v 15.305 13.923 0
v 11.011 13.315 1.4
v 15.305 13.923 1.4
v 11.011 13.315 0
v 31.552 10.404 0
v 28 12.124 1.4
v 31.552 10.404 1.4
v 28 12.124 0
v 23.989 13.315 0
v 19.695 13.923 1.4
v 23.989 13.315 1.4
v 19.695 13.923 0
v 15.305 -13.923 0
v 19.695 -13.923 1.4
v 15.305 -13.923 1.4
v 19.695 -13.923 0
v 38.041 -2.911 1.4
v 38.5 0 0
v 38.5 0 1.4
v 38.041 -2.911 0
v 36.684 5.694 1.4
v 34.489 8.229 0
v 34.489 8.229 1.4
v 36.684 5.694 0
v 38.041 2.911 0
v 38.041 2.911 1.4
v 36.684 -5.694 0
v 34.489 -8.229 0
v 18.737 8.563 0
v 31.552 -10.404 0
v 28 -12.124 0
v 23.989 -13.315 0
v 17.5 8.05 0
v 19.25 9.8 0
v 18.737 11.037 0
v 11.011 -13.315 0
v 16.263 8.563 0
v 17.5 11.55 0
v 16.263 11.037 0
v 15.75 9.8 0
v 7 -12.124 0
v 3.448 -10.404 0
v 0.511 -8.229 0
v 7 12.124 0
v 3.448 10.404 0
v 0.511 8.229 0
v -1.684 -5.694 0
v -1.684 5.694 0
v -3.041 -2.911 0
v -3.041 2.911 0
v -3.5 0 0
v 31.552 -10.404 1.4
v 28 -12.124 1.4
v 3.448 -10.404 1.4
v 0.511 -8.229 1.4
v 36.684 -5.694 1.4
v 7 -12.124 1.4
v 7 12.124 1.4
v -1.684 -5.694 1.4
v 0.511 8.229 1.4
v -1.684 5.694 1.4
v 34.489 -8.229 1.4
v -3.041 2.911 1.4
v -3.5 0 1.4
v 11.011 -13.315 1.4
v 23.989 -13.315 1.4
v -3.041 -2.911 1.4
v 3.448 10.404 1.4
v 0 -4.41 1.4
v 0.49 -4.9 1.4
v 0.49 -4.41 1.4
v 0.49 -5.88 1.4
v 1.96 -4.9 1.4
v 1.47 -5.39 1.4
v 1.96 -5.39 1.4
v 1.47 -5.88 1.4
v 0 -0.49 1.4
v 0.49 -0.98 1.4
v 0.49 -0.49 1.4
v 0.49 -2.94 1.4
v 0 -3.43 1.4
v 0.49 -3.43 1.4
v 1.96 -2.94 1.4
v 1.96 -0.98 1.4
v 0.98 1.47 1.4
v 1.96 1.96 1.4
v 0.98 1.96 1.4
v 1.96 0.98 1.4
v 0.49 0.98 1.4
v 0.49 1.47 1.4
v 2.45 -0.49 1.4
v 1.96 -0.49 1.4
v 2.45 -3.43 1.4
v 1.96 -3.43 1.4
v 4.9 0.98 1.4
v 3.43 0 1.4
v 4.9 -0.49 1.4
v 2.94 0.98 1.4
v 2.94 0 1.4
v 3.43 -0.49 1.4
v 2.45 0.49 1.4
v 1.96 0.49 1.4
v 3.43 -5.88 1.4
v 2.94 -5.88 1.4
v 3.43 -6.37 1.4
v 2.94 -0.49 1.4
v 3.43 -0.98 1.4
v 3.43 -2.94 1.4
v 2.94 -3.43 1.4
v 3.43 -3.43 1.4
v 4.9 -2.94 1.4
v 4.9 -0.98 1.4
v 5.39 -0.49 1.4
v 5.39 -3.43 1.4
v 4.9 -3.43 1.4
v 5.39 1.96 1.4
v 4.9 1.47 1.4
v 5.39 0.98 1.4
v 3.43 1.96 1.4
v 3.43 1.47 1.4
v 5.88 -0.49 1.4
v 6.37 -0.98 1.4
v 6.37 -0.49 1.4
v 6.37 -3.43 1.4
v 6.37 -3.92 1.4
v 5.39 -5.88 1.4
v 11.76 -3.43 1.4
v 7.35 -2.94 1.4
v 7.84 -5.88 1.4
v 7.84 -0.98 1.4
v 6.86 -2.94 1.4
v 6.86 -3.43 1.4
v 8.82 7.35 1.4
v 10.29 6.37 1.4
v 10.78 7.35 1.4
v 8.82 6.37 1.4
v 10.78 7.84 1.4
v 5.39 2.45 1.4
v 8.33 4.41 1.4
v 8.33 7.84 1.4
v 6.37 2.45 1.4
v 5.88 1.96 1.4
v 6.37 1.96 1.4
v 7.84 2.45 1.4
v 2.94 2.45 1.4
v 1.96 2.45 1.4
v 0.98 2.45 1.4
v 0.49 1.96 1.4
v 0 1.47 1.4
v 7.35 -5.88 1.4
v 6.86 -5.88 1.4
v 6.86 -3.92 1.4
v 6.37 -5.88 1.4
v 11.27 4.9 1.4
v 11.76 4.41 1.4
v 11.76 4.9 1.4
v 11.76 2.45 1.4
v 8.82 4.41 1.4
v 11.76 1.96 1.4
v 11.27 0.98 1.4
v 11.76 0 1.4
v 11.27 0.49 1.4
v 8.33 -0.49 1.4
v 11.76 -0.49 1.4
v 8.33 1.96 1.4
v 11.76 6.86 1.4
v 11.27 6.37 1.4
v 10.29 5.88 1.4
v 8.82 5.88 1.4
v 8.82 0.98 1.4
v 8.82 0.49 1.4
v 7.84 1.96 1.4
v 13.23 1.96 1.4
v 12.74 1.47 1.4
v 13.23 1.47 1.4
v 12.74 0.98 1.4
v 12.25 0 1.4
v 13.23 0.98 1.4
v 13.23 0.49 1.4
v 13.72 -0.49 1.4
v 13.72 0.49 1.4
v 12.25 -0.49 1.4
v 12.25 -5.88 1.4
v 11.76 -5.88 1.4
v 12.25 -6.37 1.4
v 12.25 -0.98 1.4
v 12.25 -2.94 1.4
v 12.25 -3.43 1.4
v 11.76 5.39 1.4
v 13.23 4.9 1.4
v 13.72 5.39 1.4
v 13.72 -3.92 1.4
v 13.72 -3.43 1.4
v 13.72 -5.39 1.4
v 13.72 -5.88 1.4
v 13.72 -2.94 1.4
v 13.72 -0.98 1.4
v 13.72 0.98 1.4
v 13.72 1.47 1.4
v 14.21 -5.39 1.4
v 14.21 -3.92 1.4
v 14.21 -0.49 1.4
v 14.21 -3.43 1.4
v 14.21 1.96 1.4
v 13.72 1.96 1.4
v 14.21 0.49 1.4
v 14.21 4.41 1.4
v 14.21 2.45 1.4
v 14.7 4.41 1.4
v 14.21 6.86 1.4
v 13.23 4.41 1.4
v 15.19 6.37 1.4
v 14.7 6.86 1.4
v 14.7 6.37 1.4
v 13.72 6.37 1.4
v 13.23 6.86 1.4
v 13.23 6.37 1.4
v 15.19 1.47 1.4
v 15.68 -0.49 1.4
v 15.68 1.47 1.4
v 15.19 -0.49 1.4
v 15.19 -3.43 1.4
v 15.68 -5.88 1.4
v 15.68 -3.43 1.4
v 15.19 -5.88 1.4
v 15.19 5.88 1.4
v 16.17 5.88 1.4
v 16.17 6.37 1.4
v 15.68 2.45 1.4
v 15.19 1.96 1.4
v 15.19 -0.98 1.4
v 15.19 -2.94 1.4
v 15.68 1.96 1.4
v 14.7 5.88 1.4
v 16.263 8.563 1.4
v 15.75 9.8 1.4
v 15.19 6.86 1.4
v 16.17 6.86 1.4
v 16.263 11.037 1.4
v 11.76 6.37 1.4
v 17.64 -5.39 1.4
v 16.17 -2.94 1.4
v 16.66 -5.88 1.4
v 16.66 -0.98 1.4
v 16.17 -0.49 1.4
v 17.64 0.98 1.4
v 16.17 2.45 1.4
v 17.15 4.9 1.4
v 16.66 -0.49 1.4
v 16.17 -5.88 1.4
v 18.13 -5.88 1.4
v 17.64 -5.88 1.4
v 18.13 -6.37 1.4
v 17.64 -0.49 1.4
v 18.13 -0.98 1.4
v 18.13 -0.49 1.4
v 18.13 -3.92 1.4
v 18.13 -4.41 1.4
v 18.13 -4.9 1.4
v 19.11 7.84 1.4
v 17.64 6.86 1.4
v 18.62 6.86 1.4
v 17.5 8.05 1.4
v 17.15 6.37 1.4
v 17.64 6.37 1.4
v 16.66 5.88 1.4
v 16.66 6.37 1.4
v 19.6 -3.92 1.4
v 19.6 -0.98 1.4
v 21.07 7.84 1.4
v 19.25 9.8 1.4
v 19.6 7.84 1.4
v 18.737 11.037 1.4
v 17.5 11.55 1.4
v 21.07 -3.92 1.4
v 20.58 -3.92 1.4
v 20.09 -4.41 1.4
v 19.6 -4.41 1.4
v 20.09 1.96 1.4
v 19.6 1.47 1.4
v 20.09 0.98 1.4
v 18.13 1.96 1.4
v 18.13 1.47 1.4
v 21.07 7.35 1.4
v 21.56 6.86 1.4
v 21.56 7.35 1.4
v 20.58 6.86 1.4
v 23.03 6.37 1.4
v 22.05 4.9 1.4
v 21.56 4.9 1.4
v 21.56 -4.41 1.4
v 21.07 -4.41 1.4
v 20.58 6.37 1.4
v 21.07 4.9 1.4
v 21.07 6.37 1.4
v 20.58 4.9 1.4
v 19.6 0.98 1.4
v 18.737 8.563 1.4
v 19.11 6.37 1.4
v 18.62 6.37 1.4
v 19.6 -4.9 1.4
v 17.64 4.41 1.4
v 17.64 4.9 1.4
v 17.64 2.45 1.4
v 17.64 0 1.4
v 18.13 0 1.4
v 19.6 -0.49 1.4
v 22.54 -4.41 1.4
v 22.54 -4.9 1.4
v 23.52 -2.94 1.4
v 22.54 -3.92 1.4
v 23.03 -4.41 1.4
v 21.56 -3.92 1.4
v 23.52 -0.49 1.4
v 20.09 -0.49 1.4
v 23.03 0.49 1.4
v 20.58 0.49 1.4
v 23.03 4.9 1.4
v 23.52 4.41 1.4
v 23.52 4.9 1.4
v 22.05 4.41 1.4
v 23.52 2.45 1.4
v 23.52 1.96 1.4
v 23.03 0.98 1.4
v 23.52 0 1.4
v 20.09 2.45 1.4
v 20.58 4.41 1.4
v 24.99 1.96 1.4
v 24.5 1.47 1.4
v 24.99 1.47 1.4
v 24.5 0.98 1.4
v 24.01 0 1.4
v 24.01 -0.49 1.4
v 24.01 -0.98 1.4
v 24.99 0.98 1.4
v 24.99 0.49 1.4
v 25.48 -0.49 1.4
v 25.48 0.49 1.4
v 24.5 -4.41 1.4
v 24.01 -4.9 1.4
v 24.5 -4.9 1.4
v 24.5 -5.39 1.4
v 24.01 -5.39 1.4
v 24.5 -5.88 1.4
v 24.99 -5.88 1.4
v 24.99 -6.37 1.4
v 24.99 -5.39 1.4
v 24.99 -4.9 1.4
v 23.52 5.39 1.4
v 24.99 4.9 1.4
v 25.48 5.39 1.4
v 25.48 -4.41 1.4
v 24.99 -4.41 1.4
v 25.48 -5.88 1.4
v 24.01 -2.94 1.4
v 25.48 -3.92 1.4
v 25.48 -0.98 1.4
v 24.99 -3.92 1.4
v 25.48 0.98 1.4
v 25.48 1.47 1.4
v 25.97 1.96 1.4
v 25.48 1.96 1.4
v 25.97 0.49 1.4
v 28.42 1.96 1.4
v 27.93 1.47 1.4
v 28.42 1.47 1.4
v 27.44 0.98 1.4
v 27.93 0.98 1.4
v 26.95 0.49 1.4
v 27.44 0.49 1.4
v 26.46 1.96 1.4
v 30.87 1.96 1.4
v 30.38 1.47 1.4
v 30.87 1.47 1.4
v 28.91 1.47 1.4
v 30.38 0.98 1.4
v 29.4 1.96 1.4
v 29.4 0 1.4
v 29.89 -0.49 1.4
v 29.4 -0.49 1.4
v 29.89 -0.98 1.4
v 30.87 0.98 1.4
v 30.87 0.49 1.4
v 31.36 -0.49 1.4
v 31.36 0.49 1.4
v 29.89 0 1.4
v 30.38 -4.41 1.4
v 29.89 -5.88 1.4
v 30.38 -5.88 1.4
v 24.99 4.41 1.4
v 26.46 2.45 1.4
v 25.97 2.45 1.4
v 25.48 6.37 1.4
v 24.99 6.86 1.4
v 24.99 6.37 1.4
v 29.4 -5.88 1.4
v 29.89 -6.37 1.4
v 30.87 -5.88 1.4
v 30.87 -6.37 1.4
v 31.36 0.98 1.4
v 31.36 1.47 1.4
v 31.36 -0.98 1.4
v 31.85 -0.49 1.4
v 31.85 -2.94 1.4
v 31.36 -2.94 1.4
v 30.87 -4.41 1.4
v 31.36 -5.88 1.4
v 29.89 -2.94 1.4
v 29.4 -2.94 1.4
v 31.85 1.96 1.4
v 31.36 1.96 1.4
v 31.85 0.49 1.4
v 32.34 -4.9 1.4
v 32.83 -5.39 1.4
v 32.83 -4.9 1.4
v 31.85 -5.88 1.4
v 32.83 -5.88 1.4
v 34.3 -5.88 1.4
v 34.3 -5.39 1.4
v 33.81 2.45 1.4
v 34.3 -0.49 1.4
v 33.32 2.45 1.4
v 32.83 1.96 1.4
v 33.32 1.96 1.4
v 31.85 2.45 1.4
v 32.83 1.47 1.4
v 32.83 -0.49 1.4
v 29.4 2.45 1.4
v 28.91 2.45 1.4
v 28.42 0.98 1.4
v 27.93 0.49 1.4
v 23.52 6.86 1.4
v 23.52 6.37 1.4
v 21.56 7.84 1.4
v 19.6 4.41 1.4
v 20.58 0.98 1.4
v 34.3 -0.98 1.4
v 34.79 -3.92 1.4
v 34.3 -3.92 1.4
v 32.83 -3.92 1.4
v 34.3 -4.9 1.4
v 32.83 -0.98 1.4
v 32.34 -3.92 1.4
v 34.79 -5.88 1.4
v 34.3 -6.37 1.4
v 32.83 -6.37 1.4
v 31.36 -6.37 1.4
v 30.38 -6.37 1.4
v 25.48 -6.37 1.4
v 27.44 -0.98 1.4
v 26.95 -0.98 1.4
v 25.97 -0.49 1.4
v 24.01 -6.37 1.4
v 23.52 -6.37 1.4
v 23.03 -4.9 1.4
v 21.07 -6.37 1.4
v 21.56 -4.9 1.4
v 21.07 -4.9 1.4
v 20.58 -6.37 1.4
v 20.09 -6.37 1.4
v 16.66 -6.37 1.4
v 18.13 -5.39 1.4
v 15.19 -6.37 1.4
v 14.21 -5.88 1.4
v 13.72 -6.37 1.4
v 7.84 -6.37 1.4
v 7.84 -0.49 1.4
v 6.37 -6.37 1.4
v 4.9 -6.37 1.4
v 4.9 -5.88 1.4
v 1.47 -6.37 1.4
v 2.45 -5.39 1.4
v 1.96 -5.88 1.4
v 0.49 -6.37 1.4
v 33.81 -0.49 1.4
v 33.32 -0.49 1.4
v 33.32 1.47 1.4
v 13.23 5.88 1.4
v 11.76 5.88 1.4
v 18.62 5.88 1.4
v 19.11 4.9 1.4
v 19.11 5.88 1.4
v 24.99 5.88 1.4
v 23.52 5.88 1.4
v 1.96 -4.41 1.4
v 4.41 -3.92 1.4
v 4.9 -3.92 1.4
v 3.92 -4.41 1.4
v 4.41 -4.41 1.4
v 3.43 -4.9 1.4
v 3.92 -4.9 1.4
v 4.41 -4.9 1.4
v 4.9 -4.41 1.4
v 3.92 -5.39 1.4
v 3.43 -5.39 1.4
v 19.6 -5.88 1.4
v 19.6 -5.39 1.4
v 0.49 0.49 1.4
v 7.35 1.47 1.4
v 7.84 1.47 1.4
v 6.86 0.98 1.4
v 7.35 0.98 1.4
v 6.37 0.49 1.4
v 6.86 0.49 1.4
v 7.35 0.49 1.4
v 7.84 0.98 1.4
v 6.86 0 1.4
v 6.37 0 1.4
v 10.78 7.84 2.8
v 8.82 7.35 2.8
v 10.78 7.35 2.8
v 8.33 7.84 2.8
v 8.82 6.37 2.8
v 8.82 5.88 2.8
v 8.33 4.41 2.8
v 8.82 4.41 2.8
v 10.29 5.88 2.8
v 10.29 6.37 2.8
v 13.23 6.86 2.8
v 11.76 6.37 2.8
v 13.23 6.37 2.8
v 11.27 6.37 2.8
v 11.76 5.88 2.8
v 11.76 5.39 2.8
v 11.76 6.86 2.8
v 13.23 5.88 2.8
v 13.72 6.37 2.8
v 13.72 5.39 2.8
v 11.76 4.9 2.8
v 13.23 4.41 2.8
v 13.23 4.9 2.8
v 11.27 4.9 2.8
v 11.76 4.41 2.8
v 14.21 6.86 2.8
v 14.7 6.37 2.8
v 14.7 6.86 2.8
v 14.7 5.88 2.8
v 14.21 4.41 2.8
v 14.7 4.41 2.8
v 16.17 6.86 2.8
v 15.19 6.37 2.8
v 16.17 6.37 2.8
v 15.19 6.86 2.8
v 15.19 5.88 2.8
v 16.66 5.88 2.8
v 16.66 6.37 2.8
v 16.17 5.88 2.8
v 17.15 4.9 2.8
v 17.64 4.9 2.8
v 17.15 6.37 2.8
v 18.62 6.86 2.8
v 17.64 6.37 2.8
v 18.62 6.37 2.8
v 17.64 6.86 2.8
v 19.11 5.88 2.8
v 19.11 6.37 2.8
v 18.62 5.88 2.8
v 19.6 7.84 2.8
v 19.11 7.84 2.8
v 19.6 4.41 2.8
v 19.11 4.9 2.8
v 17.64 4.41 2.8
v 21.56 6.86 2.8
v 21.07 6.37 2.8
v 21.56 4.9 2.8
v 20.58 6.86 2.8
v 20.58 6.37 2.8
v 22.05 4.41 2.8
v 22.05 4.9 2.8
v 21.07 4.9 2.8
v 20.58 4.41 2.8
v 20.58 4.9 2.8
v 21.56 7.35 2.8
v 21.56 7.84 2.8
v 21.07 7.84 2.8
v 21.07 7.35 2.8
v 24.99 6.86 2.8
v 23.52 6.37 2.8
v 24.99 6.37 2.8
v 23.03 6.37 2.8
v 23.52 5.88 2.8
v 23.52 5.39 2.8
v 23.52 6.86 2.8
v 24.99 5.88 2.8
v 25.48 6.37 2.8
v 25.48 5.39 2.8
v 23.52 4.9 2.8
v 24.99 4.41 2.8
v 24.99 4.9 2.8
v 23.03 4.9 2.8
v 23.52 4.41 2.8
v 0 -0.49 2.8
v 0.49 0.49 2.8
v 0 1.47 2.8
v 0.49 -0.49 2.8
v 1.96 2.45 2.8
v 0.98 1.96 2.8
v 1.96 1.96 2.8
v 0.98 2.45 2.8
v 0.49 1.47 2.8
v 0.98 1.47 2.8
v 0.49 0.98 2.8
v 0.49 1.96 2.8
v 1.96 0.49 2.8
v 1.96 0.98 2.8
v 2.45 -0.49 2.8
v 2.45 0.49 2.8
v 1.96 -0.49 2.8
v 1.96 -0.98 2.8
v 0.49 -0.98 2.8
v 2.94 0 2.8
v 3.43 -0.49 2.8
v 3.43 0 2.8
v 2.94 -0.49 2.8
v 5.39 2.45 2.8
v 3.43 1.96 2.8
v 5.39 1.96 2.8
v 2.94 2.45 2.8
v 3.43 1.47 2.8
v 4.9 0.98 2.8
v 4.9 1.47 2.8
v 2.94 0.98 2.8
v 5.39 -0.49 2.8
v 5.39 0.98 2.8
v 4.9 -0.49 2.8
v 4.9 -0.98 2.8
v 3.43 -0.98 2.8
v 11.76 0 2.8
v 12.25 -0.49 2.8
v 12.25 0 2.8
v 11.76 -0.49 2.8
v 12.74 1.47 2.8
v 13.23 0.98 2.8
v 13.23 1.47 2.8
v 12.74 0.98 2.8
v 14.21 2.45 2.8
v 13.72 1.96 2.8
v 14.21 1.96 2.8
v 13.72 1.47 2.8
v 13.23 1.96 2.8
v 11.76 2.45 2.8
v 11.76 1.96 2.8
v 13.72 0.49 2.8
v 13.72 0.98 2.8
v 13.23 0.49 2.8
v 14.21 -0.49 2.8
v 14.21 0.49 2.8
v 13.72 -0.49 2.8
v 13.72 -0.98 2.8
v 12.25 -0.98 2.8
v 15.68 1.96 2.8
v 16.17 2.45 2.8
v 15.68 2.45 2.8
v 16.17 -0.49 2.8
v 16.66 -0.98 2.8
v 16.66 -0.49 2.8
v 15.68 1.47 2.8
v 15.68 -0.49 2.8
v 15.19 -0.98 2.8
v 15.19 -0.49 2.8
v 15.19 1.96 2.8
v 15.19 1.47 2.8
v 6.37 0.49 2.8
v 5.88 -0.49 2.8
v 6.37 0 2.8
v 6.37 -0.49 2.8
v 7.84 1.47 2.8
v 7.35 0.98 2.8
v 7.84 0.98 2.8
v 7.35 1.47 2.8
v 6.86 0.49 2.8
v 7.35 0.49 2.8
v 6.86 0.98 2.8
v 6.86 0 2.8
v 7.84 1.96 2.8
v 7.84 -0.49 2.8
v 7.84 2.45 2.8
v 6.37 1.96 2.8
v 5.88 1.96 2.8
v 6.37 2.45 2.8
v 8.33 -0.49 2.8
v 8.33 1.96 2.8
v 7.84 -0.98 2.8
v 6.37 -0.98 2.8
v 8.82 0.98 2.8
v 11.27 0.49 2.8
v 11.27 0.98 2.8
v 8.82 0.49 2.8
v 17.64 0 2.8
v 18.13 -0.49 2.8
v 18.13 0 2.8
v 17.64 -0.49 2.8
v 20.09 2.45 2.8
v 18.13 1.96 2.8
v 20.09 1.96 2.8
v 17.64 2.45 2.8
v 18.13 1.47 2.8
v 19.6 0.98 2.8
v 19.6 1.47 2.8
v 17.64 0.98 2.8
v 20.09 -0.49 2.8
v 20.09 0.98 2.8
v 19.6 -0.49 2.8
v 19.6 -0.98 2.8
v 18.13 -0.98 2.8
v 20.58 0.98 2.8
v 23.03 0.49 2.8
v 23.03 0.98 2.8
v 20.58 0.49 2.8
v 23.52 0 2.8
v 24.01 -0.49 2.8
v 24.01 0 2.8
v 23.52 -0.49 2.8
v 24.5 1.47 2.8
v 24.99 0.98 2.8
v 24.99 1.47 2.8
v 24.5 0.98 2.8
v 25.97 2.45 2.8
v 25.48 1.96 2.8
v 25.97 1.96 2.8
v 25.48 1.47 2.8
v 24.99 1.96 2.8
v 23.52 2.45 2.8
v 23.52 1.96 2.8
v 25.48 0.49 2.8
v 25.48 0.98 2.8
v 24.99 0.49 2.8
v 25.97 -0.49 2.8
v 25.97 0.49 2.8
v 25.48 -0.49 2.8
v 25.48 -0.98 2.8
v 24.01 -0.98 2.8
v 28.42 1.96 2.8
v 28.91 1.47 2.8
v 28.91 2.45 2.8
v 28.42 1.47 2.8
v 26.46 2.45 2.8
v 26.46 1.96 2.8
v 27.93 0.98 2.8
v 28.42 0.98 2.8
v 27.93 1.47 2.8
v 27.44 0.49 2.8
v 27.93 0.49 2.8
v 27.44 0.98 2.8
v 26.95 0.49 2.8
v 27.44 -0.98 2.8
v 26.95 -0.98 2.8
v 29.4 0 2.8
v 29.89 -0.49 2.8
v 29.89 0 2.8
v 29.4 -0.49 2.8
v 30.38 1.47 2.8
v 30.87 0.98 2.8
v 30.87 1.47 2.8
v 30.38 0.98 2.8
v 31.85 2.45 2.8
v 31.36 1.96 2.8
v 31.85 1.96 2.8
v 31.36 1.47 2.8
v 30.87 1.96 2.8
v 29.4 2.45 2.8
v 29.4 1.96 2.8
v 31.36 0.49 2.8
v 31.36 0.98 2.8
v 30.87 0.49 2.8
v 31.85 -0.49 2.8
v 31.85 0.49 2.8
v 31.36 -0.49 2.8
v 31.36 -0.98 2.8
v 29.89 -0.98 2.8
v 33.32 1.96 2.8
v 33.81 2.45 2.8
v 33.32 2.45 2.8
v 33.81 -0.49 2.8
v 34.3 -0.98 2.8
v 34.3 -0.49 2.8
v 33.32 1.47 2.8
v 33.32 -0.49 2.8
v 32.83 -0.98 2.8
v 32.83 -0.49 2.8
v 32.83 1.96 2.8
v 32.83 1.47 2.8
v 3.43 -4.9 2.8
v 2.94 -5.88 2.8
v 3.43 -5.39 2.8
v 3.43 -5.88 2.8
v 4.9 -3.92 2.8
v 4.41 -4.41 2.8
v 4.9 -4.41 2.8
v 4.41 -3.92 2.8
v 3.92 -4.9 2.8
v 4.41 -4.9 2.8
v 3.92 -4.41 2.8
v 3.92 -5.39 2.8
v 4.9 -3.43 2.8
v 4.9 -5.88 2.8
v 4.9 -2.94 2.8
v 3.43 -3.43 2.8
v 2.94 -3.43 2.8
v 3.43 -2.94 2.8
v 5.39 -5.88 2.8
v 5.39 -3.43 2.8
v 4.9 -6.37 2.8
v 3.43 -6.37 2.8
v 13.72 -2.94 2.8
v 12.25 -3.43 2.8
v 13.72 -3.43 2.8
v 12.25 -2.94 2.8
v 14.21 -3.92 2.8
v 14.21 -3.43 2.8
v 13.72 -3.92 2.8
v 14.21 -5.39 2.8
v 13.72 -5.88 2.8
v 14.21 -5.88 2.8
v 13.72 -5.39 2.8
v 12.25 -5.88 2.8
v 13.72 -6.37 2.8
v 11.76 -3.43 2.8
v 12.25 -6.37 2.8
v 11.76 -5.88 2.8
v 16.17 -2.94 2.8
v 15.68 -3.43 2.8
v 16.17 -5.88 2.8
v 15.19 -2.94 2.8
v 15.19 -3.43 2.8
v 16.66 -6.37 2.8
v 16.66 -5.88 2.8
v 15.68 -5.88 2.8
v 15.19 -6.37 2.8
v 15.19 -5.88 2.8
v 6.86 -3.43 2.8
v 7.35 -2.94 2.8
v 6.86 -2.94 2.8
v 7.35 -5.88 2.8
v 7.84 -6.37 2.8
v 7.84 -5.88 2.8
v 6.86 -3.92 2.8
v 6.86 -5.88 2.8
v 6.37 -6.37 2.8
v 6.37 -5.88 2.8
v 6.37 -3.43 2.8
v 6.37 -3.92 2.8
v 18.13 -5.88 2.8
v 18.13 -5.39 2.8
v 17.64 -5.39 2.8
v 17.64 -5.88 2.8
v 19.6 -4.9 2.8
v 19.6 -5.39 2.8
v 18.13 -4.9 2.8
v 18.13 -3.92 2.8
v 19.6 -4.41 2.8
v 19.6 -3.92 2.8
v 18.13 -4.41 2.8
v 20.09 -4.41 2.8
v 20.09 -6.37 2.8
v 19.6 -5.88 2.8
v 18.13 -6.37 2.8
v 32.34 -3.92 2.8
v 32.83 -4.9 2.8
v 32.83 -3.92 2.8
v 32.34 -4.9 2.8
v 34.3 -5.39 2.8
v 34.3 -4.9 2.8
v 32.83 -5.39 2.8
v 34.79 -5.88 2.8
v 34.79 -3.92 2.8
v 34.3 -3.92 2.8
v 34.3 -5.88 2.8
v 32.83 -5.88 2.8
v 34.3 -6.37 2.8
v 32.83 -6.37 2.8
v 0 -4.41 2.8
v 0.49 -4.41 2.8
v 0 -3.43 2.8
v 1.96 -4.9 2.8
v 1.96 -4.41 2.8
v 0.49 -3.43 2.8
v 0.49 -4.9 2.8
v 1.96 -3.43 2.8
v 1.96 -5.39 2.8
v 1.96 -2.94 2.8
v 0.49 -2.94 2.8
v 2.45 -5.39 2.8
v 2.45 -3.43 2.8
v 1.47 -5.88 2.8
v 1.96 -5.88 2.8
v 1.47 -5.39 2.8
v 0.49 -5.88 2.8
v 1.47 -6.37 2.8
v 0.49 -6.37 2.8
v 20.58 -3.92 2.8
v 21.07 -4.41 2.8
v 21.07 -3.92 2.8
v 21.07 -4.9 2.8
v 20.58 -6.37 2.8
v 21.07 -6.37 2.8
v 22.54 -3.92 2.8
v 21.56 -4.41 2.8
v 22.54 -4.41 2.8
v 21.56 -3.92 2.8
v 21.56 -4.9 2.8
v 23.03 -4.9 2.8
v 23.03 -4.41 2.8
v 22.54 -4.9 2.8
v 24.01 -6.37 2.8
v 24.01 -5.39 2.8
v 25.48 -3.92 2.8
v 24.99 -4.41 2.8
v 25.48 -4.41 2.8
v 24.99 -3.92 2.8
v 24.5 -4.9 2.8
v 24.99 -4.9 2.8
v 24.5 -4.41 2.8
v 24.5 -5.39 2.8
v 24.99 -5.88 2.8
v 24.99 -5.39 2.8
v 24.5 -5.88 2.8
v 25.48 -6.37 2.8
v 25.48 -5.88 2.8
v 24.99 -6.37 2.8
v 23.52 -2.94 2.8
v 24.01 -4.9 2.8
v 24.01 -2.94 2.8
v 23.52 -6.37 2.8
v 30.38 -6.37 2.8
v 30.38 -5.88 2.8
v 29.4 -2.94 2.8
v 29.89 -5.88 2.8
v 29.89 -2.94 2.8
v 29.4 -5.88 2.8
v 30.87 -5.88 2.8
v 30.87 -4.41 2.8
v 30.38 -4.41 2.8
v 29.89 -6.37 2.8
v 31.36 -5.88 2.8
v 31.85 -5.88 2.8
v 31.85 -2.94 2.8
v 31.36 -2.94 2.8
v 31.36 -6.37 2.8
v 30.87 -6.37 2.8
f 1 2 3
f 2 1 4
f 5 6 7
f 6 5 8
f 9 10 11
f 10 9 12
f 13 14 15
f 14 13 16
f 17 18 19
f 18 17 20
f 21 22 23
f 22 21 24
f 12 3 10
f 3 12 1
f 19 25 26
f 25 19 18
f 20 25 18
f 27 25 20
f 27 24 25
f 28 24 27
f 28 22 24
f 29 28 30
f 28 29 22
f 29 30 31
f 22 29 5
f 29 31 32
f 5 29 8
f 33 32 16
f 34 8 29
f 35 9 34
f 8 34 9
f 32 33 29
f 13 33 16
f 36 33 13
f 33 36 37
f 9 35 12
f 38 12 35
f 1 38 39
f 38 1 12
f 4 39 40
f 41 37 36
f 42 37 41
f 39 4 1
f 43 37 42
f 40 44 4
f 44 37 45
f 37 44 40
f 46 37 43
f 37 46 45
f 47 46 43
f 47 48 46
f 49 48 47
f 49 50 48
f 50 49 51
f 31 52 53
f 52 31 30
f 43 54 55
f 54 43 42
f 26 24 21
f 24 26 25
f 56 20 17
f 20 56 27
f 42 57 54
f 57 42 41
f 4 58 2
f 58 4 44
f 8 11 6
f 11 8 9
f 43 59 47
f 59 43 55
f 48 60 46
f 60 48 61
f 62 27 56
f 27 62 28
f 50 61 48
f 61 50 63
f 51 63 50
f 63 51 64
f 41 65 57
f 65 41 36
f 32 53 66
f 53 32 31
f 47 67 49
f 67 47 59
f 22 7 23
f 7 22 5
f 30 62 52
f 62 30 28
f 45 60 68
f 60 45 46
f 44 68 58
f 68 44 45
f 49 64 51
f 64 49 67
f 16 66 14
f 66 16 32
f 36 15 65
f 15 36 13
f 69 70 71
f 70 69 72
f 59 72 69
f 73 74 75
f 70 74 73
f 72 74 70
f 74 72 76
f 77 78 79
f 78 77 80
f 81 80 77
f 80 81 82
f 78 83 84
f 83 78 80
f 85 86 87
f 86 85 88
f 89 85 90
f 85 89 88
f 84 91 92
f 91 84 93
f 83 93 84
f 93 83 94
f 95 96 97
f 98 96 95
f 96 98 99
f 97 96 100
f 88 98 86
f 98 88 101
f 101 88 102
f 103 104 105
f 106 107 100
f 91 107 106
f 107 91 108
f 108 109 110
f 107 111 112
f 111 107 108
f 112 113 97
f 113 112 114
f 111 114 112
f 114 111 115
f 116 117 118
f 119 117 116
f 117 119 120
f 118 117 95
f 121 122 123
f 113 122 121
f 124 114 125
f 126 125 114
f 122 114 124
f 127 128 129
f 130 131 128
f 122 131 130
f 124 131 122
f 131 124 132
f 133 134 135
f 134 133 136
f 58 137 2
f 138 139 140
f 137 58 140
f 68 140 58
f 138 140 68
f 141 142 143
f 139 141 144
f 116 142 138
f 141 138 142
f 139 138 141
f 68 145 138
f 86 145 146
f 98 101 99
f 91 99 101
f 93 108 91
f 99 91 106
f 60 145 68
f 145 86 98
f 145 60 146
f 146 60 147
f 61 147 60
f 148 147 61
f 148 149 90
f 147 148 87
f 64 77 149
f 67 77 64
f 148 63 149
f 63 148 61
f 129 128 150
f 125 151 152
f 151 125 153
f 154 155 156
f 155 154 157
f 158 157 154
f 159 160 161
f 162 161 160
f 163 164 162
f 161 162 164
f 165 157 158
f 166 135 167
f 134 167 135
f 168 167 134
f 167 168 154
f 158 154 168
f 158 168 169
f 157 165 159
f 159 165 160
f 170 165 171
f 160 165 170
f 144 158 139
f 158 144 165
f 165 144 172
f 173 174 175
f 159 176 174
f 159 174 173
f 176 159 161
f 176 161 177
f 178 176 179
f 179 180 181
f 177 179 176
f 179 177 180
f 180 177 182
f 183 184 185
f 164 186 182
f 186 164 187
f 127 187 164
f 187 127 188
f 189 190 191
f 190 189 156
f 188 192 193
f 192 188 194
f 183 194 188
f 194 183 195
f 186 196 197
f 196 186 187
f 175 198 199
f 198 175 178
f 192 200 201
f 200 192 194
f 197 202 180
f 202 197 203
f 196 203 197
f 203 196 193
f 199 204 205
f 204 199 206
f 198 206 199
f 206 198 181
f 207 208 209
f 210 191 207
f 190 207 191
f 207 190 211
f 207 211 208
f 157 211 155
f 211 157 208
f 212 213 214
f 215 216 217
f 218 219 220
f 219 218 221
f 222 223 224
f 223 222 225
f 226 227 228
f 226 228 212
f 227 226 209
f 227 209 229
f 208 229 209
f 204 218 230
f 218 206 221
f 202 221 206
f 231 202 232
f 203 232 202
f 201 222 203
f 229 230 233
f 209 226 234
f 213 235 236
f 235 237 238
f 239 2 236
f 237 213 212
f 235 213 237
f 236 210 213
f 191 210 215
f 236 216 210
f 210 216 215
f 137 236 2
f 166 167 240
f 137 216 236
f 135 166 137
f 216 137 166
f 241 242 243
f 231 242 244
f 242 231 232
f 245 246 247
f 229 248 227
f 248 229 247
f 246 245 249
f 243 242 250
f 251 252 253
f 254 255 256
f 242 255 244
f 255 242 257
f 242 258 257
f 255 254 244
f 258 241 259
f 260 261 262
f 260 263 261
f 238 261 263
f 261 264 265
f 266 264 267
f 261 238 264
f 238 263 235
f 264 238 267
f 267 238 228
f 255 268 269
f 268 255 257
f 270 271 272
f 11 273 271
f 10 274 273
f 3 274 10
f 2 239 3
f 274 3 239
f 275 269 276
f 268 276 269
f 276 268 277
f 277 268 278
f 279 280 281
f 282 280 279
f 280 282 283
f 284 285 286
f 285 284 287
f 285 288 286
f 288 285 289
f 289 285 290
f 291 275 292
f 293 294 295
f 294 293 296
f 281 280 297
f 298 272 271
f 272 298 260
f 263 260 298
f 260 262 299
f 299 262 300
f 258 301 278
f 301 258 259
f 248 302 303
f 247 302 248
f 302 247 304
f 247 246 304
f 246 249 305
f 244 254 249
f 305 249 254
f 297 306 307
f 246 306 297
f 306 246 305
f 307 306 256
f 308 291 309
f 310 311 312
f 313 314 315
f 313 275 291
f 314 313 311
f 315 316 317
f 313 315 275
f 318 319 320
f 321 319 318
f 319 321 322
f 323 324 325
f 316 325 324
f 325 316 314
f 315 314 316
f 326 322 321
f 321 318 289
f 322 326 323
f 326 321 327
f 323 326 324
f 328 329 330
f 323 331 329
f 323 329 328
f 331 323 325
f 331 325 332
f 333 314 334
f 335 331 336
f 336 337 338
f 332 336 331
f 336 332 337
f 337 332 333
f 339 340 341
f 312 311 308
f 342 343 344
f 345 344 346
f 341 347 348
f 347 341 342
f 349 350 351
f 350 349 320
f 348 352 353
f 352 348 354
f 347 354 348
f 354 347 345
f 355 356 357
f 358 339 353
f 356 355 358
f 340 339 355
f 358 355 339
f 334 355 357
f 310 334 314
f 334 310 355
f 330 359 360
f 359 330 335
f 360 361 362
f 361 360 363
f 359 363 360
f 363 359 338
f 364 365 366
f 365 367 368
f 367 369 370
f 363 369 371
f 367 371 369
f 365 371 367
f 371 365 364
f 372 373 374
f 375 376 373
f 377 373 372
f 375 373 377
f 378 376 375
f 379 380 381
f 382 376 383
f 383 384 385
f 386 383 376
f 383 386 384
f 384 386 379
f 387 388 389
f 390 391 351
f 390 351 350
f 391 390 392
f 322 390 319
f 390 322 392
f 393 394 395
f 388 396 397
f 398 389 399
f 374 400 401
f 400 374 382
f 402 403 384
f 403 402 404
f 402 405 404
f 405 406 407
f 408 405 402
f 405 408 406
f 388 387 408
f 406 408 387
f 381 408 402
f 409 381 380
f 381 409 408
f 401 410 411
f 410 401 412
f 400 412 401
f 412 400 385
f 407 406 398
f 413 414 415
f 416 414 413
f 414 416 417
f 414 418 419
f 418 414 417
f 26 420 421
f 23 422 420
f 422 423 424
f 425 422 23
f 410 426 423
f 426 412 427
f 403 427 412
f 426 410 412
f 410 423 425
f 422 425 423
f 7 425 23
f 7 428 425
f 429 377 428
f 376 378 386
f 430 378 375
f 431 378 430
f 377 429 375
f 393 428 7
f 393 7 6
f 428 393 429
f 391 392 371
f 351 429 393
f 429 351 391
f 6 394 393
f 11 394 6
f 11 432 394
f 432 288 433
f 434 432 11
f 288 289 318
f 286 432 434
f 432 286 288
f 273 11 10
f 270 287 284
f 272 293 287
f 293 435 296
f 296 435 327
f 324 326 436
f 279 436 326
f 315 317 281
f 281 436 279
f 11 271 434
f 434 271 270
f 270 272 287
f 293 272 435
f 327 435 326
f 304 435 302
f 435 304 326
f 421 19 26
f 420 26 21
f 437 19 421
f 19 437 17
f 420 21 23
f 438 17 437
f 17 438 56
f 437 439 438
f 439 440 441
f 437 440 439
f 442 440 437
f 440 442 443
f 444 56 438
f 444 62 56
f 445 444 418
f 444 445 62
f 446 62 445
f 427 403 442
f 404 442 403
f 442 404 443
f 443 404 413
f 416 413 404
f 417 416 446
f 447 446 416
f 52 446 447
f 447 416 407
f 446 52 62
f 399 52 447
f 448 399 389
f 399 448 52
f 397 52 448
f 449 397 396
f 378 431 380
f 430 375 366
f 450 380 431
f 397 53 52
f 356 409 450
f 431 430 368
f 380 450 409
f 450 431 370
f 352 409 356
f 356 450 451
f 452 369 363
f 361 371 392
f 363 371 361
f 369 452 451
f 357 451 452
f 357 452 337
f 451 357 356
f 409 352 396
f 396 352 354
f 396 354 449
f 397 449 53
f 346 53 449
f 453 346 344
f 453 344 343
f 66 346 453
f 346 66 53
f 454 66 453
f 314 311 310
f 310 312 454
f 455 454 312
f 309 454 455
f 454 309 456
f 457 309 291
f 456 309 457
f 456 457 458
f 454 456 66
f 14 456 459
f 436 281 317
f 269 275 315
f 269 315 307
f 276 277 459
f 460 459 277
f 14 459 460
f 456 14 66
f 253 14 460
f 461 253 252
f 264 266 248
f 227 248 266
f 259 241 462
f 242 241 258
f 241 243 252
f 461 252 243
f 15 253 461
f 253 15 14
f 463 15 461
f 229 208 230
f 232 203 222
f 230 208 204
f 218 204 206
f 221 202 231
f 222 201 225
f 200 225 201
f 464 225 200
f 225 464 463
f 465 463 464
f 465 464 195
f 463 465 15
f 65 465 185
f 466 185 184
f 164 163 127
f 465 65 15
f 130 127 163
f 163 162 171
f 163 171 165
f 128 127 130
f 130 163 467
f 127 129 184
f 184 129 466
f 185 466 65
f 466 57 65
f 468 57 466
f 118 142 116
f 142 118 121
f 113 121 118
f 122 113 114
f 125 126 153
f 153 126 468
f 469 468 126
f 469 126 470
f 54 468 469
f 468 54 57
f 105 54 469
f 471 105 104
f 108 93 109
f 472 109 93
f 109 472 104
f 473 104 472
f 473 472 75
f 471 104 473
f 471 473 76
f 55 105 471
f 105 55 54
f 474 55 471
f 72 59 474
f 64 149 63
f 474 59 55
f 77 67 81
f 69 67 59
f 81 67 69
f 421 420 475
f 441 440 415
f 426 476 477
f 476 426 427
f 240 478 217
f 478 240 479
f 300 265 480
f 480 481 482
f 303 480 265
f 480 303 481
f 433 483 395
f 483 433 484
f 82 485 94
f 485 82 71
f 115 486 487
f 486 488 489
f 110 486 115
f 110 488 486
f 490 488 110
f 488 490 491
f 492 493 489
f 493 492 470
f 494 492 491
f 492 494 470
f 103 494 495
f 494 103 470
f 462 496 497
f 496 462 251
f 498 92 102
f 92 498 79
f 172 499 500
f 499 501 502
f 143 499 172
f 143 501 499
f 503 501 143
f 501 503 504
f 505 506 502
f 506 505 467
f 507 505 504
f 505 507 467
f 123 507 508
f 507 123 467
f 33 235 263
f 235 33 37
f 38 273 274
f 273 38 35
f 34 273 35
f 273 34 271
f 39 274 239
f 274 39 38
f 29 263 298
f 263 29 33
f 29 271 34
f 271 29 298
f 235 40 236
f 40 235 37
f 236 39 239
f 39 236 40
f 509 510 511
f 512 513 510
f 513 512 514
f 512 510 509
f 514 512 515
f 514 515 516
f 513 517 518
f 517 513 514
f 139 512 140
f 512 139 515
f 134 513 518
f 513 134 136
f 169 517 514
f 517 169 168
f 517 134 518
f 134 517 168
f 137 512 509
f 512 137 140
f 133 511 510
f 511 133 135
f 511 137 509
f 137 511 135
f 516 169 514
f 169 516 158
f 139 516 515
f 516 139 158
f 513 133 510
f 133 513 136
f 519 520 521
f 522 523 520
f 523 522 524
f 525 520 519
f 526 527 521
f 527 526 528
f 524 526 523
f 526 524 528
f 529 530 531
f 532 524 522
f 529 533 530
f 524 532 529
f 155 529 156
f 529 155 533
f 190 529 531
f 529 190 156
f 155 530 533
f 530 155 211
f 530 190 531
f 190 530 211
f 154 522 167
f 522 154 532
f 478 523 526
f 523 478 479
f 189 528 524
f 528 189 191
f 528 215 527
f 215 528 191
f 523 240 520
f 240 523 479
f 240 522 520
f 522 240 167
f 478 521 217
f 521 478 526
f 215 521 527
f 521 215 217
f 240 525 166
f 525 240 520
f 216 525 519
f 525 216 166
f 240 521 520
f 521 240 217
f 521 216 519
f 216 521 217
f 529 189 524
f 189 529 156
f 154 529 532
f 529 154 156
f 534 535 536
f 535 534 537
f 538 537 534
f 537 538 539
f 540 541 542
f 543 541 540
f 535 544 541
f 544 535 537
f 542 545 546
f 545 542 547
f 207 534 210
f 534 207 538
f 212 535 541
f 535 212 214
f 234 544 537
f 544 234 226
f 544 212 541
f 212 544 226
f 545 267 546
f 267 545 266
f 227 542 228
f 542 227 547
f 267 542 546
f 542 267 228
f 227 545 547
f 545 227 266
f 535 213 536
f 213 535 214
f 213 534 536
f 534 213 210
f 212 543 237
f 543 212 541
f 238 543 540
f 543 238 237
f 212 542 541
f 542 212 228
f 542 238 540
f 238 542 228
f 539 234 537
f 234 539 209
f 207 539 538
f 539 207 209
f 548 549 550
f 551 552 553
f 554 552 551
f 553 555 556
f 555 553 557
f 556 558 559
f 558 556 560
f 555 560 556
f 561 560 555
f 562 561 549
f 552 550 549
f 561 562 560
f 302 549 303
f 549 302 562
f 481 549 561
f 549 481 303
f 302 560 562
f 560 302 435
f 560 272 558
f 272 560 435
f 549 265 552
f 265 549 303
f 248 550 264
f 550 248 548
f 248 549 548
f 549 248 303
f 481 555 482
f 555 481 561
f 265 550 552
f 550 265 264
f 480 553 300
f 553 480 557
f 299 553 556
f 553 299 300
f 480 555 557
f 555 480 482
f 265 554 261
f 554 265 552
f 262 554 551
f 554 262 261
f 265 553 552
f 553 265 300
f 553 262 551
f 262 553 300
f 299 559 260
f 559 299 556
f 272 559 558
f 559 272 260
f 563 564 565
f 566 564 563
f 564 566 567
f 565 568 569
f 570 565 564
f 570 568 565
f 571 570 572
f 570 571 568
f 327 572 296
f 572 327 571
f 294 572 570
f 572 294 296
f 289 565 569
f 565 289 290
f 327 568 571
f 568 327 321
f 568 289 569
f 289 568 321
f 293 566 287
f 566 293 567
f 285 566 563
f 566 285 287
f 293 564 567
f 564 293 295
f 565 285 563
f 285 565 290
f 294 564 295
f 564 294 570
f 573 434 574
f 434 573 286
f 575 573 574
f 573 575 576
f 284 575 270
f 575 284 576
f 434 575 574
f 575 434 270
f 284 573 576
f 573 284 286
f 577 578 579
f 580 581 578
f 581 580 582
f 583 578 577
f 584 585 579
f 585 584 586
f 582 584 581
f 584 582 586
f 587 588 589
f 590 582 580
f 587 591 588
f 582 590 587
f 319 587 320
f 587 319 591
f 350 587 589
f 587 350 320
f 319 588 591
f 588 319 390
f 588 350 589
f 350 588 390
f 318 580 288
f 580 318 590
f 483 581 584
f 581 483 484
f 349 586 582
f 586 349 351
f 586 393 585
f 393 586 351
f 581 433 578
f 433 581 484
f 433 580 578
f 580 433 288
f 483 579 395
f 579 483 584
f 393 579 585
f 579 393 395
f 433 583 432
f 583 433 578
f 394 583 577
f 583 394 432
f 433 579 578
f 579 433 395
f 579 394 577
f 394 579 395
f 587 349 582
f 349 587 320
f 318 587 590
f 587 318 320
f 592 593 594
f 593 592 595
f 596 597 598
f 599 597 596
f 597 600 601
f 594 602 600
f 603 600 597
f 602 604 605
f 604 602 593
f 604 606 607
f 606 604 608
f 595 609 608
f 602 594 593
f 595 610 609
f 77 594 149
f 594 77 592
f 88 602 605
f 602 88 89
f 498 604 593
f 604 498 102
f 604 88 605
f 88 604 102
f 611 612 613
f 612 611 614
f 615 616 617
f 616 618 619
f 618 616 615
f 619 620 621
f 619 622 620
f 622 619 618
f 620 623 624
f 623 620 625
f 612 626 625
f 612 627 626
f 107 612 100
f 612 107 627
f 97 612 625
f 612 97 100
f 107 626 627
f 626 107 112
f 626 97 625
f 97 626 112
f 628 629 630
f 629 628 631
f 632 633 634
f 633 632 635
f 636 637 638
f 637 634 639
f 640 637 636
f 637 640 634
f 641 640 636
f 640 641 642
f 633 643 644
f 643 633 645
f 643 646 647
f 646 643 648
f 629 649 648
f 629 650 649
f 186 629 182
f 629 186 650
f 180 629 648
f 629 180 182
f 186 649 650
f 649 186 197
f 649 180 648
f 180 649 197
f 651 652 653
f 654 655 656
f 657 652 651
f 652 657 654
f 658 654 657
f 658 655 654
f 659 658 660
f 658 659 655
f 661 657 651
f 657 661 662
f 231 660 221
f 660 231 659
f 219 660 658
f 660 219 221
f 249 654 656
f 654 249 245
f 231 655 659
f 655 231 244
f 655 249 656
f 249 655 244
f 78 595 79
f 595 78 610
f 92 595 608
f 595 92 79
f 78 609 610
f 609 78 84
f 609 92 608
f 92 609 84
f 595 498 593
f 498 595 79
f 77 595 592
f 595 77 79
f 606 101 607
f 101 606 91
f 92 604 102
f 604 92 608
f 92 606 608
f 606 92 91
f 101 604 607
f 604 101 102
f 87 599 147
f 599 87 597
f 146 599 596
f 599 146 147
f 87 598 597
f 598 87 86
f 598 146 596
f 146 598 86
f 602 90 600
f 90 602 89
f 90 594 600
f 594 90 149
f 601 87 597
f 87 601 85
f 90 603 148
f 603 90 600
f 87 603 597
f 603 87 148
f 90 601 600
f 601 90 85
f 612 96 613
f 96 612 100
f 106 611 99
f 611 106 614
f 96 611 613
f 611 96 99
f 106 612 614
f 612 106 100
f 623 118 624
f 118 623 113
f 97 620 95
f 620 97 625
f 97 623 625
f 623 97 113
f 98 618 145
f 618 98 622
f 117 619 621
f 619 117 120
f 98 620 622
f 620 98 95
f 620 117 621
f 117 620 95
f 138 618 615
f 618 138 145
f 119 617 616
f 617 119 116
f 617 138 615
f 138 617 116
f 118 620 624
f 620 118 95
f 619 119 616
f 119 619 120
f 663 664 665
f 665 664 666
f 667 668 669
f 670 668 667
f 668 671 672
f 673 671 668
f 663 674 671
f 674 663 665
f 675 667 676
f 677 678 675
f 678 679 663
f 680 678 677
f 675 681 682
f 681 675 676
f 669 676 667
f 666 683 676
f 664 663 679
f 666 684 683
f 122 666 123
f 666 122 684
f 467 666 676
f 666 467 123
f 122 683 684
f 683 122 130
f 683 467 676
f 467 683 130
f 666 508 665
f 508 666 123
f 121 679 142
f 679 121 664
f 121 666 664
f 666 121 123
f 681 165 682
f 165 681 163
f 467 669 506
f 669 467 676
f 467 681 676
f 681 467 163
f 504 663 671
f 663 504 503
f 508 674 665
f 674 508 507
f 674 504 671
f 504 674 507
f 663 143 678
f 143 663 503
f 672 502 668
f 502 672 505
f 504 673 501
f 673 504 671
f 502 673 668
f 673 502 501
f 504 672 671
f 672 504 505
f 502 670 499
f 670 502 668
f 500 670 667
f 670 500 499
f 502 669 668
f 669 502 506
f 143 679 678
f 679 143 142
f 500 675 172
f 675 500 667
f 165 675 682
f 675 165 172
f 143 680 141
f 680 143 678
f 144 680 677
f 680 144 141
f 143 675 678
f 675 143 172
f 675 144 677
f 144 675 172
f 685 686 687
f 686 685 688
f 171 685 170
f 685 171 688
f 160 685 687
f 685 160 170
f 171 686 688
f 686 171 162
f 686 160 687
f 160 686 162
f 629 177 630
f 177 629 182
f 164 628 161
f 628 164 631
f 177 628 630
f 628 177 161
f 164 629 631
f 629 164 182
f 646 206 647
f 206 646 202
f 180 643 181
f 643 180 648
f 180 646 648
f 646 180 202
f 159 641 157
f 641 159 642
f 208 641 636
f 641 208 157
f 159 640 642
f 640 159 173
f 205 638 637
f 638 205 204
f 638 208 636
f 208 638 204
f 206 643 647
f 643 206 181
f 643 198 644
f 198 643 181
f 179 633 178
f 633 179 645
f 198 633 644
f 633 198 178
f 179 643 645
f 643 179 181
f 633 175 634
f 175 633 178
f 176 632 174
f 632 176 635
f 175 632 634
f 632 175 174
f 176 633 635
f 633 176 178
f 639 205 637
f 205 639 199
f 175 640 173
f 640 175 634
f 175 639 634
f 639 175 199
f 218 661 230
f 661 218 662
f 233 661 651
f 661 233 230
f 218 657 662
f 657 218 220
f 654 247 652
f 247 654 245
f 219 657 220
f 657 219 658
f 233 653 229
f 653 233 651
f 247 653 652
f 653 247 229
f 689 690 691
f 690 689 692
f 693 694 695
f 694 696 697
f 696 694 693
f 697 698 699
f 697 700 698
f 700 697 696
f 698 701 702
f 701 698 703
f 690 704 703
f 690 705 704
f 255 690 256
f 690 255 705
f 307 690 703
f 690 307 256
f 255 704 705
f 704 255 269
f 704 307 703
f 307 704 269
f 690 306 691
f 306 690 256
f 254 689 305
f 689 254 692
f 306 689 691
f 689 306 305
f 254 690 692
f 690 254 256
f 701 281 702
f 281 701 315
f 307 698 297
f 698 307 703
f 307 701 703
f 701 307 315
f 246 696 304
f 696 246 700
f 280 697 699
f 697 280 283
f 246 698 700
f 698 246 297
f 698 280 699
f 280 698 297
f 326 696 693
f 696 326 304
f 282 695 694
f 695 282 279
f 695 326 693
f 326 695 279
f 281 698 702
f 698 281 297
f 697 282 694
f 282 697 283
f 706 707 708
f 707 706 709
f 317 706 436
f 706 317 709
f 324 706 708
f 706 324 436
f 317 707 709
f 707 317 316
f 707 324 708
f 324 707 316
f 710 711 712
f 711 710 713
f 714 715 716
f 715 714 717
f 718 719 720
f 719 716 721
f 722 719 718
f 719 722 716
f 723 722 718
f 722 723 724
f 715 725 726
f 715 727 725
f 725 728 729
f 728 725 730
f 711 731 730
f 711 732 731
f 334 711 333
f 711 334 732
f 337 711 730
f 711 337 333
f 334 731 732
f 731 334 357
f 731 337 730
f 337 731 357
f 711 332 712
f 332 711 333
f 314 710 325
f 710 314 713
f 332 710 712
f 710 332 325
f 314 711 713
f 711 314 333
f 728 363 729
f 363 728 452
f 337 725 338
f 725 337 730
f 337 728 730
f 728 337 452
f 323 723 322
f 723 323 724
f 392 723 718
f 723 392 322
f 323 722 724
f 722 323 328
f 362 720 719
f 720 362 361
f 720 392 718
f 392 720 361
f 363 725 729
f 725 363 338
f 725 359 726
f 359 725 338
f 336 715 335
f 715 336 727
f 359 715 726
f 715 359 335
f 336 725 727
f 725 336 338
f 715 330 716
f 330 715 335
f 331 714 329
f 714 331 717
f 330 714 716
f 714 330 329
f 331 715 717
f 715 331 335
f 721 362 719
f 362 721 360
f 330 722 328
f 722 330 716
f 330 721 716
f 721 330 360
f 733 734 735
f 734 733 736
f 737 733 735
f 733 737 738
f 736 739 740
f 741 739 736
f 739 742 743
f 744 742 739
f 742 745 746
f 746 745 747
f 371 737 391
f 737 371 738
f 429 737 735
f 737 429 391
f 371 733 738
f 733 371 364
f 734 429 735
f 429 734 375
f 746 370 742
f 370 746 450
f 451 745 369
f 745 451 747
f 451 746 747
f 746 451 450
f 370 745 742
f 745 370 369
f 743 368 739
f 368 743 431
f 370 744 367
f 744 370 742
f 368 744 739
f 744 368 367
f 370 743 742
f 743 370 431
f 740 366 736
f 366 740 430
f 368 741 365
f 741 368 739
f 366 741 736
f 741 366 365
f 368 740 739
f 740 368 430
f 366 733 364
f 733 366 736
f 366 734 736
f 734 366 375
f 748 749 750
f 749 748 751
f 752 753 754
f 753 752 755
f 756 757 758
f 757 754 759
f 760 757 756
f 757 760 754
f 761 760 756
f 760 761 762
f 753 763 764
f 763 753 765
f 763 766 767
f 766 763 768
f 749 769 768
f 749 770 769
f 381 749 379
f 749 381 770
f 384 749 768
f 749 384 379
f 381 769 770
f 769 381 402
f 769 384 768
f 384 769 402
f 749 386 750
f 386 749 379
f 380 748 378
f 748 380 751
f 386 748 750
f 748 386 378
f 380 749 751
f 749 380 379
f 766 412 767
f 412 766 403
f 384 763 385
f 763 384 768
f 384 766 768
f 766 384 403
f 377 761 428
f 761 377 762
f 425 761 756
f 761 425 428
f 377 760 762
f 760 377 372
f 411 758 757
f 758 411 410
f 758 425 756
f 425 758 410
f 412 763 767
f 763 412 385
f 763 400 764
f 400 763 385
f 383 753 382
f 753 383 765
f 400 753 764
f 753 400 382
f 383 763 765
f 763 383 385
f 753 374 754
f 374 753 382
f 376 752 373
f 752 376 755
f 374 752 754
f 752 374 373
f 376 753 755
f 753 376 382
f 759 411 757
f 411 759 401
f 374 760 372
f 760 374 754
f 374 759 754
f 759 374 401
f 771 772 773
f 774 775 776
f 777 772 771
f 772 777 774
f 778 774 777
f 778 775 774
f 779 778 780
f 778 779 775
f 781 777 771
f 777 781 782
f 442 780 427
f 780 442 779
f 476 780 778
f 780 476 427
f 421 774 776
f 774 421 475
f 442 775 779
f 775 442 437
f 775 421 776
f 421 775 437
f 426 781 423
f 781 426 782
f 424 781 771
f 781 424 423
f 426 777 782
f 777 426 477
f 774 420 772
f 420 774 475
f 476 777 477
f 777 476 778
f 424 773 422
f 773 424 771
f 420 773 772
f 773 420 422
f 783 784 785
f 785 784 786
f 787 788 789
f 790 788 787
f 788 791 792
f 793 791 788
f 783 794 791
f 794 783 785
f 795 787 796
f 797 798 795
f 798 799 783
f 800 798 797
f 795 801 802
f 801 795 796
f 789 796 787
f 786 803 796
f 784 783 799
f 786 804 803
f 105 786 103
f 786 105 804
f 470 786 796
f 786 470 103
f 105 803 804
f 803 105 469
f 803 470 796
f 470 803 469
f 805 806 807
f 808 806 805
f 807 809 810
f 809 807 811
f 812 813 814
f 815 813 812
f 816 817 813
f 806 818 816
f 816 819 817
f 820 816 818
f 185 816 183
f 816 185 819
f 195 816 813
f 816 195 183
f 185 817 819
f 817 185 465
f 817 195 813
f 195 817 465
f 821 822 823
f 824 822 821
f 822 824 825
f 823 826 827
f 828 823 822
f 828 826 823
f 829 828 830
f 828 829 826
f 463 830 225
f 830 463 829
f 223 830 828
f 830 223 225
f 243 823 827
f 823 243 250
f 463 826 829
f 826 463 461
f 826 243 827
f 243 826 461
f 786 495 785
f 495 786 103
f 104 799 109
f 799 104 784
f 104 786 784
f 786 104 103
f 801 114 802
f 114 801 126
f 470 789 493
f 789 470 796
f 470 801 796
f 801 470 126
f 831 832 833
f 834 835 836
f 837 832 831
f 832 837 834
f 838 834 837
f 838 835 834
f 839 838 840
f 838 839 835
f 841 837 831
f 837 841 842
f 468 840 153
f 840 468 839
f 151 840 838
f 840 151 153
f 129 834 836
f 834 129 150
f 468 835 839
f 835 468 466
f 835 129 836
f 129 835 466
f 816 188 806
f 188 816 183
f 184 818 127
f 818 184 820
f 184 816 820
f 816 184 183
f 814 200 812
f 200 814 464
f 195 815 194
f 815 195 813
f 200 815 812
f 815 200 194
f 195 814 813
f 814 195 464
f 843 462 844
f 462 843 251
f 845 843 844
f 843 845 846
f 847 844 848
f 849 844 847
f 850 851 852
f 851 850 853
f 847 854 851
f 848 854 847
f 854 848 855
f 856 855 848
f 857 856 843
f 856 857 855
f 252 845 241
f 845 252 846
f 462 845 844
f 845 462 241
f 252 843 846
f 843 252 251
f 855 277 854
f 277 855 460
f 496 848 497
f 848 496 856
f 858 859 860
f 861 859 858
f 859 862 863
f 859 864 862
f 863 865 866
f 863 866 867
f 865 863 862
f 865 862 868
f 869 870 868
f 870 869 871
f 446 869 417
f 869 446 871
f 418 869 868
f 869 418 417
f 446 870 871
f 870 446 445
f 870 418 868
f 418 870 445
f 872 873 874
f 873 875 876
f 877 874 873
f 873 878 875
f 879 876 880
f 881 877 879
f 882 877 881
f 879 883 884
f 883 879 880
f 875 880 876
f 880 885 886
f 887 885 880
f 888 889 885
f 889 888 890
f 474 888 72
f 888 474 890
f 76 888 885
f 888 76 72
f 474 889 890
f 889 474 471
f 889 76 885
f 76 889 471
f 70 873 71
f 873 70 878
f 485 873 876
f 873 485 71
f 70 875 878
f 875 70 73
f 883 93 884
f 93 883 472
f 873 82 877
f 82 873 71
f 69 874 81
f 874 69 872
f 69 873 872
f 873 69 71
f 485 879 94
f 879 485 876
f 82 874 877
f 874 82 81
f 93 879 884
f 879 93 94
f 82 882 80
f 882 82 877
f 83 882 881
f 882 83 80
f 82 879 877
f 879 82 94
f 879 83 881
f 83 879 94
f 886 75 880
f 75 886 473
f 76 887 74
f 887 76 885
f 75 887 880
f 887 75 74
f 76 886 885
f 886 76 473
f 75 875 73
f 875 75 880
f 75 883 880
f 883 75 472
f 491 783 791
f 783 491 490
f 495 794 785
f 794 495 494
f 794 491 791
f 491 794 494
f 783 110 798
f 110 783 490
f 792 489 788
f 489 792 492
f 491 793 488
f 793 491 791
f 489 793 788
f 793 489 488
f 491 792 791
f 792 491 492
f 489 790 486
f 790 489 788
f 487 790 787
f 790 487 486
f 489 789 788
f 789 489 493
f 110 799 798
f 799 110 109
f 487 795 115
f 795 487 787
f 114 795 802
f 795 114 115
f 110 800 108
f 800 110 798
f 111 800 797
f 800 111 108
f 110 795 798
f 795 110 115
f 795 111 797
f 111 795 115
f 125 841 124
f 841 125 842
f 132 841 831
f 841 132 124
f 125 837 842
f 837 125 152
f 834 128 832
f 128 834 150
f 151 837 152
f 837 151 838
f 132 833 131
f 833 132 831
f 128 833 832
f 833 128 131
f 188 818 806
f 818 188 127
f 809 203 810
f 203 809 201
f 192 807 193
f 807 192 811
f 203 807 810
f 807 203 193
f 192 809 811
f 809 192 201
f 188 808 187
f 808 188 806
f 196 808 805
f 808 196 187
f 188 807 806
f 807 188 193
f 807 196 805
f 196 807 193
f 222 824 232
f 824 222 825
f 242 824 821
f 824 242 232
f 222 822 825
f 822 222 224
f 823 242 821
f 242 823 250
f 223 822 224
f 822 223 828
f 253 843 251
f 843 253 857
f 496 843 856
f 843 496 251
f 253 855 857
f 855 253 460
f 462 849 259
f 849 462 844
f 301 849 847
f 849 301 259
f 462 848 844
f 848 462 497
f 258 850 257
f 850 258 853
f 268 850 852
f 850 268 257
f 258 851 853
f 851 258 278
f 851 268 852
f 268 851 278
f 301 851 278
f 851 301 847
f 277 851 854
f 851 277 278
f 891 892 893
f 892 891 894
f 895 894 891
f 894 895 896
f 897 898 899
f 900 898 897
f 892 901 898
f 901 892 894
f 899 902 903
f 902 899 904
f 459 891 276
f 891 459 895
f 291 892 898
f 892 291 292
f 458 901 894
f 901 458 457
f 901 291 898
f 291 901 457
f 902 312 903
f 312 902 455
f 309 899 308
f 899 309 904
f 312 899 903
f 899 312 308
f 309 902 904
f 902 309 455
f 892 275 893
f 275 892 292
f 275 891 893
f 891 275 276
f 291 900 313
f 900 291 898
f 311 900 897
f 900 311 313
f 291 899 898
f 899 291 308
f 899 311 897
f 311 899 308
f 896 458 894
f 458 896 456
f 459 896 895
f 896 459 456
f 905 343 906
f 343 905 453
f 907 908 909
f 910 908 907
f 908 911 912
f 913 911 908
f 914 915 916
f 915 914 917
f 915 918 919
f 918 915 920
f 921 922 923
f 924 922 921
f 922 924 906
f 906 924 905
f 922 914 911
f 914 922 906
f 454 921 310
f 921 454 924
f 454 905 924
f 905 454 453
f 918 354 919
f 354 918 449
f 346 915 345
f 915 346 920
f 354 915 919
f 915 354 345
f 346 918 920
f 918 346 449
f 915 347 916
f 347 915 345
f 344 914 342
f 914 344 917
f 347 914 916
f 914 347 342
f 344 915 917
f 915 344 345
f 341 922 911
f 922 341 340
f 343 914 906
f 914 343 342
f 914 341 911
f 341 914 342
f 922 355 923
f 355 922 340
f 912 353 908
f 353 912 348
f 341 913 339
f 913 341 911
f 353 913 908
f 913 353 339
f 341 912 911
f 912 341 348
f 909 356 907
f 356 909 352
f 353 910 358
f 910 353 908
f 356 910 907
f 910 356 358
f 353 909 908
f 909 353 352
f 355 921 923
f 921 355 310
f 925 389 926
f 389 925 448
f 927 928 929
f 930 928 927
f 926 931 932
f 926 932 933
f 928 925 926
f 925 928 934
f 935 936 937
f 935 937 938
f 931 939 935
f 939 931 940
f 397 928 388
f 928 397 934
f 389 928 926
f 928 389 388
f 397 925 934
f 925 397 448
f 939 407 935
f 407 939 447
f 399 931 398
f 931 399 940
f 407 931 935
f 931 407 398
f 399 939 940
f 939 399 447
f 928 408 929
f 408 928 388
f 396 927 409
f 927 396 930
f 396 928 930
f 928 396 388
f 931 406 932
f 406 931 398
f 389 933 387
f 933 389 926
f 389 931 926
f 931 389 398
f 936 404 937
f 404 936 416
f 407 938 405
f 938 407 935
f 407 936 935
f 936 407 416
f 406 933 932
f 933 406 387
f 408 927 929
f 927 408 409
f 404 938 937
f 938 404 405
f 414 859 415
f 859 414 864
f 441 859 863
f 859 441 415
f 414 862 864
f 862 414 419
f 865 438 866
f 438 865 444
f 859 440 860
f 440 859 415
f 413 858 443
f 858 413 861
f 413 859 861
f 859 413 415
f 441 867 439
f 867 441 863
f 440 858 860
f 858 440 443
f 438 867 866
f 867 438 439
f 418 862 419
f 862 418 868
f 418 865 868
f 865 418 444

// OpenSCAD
//Draw text

s = 0.7;
h = 2;
module oval(w, h, height, center = false) {
  scale([1, h/w, 1]) cylinder(h=height, r=w, center=center);
}

s2 = .7;
scale([s2,s2,s2]){
difference(){
translate([25,0,0]) oval(30, 20, h);
translate([25,14,-.1]) cylinder(r=2.5, h=h*2);
}
translate([17*s,11*s-2*s,h-2]) scale([s,s,4]) drawtext("Ferdie");
translate([0,    0-2*s,h-2])   scale([s,s,4]) drawtext("650-315-3731");
translate([0*s,-11*s-2*s,h-2]) scale([s,s,4]) drawtext("901 Clark Wy");
}

//Draw character set
//scale([2,2,2]) drawtext(" !\"#$%&'()*+,-./0123456789:;<=>?@ABCDEFGHIJKLMNOPQRSTUVWXYZ[\\]^_`abcdefghijklmnopqrstuvwxyz{|}");

module drawtext(text) {
	//Characters
	chars = " !\"#$%&'()*+,-./0123456789:;<=>?@ABCDEFGHIJKLMNOPQRSTUVWXYZ[\\]^_`abcdefghijklmnopqrstuvwxyz{|}";

	//Chracter table defining 5x7 characters
	//Adapted from: http://www.geocities.com/dinceraydin/djlcdsim/chartable.js
	char_table = [ [ 0, 0, 0, 0, 0, 0, 0],
                  [ 4, 0, 4, 4, 4, 4, 4],
                  [ 0, 0, 0, 0,10,10,10],
                  [10,10,31,10,31,10,10],
                  [ 4,30, 5,14,20,15, 4],
                  [ 3,19, 8, 4, 2,25,24],
                  [13,18,21, 8,20,18,12],
                  [ 0, 0, 0, 0, 8, 4,12],
                  [ 2, 4, 8, 8, 8, 4, 2],
                  [ 8, 4, 2, 2, 2, 4, 8],
                  [ 0, 4,21,14,21, 4, 0],
                  [ 0, 4, 4,31, 4, 4, 0],
                  [ 8, 4,12, 0, 0, 0, 0],
                  [ 0, 0, 0,31, 0, 0, 0],
                  [12,12, 0, 0, 0, 0, 0],
                  [ 0,16, 8, 4, 2, 1, 0],
                  [14,17,25,21,19,17,14],
                  [14, 4, 4, 4, 4,12, 4],
                  [31, 8, 4, 2, 1,17,14],
                  [14,17, 1, 2, 4, 2,31],
                  [ 2, 2,31,18,10, 6, 2],
                  [14,17, 1, 1,30,16,31],
                  [14,17,17,30,16, 8, 6],
                  [ 8, 8, 8, 4, 2, 1,31],
                  [14,17,17,14,17,17,14],
                  [12, 2, 1,15,17,17,14],
                  [ 0,12,12, 0,12,12, 0],
                  [ 8, 4,12, 0,12,12, 0],
                  [ 2, 4, 8,16, 8, 4, 2],
                  [ 0, 0,31, 0,31, 0, 0],
                  [16, 8, 4, 2, 4, 8,16],
                  [ 4, 0, 4, 2, 1,17,14],
                  [14,21,21,13, 1,17,14],
                  [17,17,31,17,17,17,14],
                  [30,17,17,30,17,17,30],
                  [14,17,16,16,16,17,14],
                  [30,17,17,17,17,17,30],
                  [31,16,16,30,16,16,31],
                  [16,16,16,30,16,16,31],
                  [15,17,17,23,16,17,14],
                  [17,17,17,31,17,17,17],
                  [14, 4, 4, 4, 4, 4,14],
                  [12,18, 2, 2, 2, 2, 7],
                  [17,18,20,24,20,18,17],
                  [31,16,16,16,16,16,16],
                  [17,17,17,21,21,27,17],
                  [17,17,19,21,25,17,17],
                  [14,17,17,17,17,17,14],
                  [16,16,16,30,17,17,30],
                  [13,18,21,17,17,17,14],
                  [17,18,20,30,17,17,30],
                  [30, 1, 1,14,16,16,15],
                  [ 4, 4, 4, 4, 4, 4,31],
                  [14,17,17,17,17,17,17],
                  [ 4,10,17,17,17,17,17],
                  [10,21,21,21,17,17,17],
                  [17,17,10, 4,10,17,17],
                  [ 4, 4, 4,10,17,17,17],
                  [31,16, 8, 4, 2, 1,31],
                  [14, 8, 8, 8, 8, 8,14],
                  [ 0, 1, 2, 4, 8,16, 0],
                  [14, 2, 2, 2, 2, 2,14],
                  [ 0, 0, 0, 0,17,10, 4],
                  [31, 0, 0, 0, 0, 0, 0],
                  [ 0, 0, 0, 0, 2, 4, 8],
                  [15,17,15, 1,14, 0, 0],
                  [30,17,17,25,22,16,16],
                  [14,17,16,16,14, 0, 0],
                  [15,17,17,19,13, 1, 1],
                  [14,16,31,17,14, 0, 0],
                  [ 8, 8, 8,28, 8, 9, 6],
                  [14, 1,15,17,15, 0, 0],
                  [17,17,17,25,22,16,16],
                  [14, 4, 4, 4,12, 0, 4],
                  [12,18, 2, 2, 2, 6, 2],
                  [18,20,24,20,18,16,16],
                  [14, 4, 4, 4, 4, 4,12],
                  [17,17,21,21,26, 0, 0],
                  [17,17,17,25,22, 0, 0],
                  [14,17,17,17,14, 0, 0],
                  [16,16,30,17,30, 0, 0],
                  [ 1, 1,15,19,13, 0, 0],
                  [16,16,16,25,22, 0, 0],
                  [30, 1,14,16,15, 0, 0],
                  [ 6, 9, 8, 8,28, 8, 8],
                  [13,19,17,17,17, 0, 0],
                  [ 4,10,17,17,17, 0, 0],
                  [10,21,21,17,17, 0, 0],
                  [17,10, 4,10,17, 0, 0],
                  [14, 1,15,17,17, 0, 0],
                  [31, 8, 4, 2,31, 0, 0],
                  [ 2, 4, 4, 8, 4, 4, 2],
                  [ 4, 4, 4, 4, 4, 4, 4],
                  [ 8, 4, 4, 2, 4, 4, 8] ];

	//Binary decode table
	dec_table = [ "00000", "00001", "00010", "00011", "00100", "00101",
  	            "00110", "00111", "01000", "01001", "01010", "01011",
  	            "01100", "01101", "01110", "01111", "10000", "10001",
  	            "10010", "10011", "10100", "10101", "10110", "10111",
	            "11000", "11001", "11010", "11011", "11100", "11101",
	            "11110", "11111" ];

	//Process string one character at a time
	for(itext = [0:len(text)-1]) {
		//Convert character to index
		assign(ichar = search(text[itext],chars,1)[0]) {
			//Decode character - rows
			for(irow = [0:6]) {
				assign(val = dec_table[char_table[ichar][irow]]) {
					//Decode character - cols
					for(icol = [0:4]) {
						assign(bit = search(val[icol],"01",1)[0]) {
							if(bit) {
								//Output cube
								translate([icol + (6*itext), irow, 0])
									cube([1.0001,1.0001,1]);
							}
						}
					}
				}
			}
		}
	}
}
